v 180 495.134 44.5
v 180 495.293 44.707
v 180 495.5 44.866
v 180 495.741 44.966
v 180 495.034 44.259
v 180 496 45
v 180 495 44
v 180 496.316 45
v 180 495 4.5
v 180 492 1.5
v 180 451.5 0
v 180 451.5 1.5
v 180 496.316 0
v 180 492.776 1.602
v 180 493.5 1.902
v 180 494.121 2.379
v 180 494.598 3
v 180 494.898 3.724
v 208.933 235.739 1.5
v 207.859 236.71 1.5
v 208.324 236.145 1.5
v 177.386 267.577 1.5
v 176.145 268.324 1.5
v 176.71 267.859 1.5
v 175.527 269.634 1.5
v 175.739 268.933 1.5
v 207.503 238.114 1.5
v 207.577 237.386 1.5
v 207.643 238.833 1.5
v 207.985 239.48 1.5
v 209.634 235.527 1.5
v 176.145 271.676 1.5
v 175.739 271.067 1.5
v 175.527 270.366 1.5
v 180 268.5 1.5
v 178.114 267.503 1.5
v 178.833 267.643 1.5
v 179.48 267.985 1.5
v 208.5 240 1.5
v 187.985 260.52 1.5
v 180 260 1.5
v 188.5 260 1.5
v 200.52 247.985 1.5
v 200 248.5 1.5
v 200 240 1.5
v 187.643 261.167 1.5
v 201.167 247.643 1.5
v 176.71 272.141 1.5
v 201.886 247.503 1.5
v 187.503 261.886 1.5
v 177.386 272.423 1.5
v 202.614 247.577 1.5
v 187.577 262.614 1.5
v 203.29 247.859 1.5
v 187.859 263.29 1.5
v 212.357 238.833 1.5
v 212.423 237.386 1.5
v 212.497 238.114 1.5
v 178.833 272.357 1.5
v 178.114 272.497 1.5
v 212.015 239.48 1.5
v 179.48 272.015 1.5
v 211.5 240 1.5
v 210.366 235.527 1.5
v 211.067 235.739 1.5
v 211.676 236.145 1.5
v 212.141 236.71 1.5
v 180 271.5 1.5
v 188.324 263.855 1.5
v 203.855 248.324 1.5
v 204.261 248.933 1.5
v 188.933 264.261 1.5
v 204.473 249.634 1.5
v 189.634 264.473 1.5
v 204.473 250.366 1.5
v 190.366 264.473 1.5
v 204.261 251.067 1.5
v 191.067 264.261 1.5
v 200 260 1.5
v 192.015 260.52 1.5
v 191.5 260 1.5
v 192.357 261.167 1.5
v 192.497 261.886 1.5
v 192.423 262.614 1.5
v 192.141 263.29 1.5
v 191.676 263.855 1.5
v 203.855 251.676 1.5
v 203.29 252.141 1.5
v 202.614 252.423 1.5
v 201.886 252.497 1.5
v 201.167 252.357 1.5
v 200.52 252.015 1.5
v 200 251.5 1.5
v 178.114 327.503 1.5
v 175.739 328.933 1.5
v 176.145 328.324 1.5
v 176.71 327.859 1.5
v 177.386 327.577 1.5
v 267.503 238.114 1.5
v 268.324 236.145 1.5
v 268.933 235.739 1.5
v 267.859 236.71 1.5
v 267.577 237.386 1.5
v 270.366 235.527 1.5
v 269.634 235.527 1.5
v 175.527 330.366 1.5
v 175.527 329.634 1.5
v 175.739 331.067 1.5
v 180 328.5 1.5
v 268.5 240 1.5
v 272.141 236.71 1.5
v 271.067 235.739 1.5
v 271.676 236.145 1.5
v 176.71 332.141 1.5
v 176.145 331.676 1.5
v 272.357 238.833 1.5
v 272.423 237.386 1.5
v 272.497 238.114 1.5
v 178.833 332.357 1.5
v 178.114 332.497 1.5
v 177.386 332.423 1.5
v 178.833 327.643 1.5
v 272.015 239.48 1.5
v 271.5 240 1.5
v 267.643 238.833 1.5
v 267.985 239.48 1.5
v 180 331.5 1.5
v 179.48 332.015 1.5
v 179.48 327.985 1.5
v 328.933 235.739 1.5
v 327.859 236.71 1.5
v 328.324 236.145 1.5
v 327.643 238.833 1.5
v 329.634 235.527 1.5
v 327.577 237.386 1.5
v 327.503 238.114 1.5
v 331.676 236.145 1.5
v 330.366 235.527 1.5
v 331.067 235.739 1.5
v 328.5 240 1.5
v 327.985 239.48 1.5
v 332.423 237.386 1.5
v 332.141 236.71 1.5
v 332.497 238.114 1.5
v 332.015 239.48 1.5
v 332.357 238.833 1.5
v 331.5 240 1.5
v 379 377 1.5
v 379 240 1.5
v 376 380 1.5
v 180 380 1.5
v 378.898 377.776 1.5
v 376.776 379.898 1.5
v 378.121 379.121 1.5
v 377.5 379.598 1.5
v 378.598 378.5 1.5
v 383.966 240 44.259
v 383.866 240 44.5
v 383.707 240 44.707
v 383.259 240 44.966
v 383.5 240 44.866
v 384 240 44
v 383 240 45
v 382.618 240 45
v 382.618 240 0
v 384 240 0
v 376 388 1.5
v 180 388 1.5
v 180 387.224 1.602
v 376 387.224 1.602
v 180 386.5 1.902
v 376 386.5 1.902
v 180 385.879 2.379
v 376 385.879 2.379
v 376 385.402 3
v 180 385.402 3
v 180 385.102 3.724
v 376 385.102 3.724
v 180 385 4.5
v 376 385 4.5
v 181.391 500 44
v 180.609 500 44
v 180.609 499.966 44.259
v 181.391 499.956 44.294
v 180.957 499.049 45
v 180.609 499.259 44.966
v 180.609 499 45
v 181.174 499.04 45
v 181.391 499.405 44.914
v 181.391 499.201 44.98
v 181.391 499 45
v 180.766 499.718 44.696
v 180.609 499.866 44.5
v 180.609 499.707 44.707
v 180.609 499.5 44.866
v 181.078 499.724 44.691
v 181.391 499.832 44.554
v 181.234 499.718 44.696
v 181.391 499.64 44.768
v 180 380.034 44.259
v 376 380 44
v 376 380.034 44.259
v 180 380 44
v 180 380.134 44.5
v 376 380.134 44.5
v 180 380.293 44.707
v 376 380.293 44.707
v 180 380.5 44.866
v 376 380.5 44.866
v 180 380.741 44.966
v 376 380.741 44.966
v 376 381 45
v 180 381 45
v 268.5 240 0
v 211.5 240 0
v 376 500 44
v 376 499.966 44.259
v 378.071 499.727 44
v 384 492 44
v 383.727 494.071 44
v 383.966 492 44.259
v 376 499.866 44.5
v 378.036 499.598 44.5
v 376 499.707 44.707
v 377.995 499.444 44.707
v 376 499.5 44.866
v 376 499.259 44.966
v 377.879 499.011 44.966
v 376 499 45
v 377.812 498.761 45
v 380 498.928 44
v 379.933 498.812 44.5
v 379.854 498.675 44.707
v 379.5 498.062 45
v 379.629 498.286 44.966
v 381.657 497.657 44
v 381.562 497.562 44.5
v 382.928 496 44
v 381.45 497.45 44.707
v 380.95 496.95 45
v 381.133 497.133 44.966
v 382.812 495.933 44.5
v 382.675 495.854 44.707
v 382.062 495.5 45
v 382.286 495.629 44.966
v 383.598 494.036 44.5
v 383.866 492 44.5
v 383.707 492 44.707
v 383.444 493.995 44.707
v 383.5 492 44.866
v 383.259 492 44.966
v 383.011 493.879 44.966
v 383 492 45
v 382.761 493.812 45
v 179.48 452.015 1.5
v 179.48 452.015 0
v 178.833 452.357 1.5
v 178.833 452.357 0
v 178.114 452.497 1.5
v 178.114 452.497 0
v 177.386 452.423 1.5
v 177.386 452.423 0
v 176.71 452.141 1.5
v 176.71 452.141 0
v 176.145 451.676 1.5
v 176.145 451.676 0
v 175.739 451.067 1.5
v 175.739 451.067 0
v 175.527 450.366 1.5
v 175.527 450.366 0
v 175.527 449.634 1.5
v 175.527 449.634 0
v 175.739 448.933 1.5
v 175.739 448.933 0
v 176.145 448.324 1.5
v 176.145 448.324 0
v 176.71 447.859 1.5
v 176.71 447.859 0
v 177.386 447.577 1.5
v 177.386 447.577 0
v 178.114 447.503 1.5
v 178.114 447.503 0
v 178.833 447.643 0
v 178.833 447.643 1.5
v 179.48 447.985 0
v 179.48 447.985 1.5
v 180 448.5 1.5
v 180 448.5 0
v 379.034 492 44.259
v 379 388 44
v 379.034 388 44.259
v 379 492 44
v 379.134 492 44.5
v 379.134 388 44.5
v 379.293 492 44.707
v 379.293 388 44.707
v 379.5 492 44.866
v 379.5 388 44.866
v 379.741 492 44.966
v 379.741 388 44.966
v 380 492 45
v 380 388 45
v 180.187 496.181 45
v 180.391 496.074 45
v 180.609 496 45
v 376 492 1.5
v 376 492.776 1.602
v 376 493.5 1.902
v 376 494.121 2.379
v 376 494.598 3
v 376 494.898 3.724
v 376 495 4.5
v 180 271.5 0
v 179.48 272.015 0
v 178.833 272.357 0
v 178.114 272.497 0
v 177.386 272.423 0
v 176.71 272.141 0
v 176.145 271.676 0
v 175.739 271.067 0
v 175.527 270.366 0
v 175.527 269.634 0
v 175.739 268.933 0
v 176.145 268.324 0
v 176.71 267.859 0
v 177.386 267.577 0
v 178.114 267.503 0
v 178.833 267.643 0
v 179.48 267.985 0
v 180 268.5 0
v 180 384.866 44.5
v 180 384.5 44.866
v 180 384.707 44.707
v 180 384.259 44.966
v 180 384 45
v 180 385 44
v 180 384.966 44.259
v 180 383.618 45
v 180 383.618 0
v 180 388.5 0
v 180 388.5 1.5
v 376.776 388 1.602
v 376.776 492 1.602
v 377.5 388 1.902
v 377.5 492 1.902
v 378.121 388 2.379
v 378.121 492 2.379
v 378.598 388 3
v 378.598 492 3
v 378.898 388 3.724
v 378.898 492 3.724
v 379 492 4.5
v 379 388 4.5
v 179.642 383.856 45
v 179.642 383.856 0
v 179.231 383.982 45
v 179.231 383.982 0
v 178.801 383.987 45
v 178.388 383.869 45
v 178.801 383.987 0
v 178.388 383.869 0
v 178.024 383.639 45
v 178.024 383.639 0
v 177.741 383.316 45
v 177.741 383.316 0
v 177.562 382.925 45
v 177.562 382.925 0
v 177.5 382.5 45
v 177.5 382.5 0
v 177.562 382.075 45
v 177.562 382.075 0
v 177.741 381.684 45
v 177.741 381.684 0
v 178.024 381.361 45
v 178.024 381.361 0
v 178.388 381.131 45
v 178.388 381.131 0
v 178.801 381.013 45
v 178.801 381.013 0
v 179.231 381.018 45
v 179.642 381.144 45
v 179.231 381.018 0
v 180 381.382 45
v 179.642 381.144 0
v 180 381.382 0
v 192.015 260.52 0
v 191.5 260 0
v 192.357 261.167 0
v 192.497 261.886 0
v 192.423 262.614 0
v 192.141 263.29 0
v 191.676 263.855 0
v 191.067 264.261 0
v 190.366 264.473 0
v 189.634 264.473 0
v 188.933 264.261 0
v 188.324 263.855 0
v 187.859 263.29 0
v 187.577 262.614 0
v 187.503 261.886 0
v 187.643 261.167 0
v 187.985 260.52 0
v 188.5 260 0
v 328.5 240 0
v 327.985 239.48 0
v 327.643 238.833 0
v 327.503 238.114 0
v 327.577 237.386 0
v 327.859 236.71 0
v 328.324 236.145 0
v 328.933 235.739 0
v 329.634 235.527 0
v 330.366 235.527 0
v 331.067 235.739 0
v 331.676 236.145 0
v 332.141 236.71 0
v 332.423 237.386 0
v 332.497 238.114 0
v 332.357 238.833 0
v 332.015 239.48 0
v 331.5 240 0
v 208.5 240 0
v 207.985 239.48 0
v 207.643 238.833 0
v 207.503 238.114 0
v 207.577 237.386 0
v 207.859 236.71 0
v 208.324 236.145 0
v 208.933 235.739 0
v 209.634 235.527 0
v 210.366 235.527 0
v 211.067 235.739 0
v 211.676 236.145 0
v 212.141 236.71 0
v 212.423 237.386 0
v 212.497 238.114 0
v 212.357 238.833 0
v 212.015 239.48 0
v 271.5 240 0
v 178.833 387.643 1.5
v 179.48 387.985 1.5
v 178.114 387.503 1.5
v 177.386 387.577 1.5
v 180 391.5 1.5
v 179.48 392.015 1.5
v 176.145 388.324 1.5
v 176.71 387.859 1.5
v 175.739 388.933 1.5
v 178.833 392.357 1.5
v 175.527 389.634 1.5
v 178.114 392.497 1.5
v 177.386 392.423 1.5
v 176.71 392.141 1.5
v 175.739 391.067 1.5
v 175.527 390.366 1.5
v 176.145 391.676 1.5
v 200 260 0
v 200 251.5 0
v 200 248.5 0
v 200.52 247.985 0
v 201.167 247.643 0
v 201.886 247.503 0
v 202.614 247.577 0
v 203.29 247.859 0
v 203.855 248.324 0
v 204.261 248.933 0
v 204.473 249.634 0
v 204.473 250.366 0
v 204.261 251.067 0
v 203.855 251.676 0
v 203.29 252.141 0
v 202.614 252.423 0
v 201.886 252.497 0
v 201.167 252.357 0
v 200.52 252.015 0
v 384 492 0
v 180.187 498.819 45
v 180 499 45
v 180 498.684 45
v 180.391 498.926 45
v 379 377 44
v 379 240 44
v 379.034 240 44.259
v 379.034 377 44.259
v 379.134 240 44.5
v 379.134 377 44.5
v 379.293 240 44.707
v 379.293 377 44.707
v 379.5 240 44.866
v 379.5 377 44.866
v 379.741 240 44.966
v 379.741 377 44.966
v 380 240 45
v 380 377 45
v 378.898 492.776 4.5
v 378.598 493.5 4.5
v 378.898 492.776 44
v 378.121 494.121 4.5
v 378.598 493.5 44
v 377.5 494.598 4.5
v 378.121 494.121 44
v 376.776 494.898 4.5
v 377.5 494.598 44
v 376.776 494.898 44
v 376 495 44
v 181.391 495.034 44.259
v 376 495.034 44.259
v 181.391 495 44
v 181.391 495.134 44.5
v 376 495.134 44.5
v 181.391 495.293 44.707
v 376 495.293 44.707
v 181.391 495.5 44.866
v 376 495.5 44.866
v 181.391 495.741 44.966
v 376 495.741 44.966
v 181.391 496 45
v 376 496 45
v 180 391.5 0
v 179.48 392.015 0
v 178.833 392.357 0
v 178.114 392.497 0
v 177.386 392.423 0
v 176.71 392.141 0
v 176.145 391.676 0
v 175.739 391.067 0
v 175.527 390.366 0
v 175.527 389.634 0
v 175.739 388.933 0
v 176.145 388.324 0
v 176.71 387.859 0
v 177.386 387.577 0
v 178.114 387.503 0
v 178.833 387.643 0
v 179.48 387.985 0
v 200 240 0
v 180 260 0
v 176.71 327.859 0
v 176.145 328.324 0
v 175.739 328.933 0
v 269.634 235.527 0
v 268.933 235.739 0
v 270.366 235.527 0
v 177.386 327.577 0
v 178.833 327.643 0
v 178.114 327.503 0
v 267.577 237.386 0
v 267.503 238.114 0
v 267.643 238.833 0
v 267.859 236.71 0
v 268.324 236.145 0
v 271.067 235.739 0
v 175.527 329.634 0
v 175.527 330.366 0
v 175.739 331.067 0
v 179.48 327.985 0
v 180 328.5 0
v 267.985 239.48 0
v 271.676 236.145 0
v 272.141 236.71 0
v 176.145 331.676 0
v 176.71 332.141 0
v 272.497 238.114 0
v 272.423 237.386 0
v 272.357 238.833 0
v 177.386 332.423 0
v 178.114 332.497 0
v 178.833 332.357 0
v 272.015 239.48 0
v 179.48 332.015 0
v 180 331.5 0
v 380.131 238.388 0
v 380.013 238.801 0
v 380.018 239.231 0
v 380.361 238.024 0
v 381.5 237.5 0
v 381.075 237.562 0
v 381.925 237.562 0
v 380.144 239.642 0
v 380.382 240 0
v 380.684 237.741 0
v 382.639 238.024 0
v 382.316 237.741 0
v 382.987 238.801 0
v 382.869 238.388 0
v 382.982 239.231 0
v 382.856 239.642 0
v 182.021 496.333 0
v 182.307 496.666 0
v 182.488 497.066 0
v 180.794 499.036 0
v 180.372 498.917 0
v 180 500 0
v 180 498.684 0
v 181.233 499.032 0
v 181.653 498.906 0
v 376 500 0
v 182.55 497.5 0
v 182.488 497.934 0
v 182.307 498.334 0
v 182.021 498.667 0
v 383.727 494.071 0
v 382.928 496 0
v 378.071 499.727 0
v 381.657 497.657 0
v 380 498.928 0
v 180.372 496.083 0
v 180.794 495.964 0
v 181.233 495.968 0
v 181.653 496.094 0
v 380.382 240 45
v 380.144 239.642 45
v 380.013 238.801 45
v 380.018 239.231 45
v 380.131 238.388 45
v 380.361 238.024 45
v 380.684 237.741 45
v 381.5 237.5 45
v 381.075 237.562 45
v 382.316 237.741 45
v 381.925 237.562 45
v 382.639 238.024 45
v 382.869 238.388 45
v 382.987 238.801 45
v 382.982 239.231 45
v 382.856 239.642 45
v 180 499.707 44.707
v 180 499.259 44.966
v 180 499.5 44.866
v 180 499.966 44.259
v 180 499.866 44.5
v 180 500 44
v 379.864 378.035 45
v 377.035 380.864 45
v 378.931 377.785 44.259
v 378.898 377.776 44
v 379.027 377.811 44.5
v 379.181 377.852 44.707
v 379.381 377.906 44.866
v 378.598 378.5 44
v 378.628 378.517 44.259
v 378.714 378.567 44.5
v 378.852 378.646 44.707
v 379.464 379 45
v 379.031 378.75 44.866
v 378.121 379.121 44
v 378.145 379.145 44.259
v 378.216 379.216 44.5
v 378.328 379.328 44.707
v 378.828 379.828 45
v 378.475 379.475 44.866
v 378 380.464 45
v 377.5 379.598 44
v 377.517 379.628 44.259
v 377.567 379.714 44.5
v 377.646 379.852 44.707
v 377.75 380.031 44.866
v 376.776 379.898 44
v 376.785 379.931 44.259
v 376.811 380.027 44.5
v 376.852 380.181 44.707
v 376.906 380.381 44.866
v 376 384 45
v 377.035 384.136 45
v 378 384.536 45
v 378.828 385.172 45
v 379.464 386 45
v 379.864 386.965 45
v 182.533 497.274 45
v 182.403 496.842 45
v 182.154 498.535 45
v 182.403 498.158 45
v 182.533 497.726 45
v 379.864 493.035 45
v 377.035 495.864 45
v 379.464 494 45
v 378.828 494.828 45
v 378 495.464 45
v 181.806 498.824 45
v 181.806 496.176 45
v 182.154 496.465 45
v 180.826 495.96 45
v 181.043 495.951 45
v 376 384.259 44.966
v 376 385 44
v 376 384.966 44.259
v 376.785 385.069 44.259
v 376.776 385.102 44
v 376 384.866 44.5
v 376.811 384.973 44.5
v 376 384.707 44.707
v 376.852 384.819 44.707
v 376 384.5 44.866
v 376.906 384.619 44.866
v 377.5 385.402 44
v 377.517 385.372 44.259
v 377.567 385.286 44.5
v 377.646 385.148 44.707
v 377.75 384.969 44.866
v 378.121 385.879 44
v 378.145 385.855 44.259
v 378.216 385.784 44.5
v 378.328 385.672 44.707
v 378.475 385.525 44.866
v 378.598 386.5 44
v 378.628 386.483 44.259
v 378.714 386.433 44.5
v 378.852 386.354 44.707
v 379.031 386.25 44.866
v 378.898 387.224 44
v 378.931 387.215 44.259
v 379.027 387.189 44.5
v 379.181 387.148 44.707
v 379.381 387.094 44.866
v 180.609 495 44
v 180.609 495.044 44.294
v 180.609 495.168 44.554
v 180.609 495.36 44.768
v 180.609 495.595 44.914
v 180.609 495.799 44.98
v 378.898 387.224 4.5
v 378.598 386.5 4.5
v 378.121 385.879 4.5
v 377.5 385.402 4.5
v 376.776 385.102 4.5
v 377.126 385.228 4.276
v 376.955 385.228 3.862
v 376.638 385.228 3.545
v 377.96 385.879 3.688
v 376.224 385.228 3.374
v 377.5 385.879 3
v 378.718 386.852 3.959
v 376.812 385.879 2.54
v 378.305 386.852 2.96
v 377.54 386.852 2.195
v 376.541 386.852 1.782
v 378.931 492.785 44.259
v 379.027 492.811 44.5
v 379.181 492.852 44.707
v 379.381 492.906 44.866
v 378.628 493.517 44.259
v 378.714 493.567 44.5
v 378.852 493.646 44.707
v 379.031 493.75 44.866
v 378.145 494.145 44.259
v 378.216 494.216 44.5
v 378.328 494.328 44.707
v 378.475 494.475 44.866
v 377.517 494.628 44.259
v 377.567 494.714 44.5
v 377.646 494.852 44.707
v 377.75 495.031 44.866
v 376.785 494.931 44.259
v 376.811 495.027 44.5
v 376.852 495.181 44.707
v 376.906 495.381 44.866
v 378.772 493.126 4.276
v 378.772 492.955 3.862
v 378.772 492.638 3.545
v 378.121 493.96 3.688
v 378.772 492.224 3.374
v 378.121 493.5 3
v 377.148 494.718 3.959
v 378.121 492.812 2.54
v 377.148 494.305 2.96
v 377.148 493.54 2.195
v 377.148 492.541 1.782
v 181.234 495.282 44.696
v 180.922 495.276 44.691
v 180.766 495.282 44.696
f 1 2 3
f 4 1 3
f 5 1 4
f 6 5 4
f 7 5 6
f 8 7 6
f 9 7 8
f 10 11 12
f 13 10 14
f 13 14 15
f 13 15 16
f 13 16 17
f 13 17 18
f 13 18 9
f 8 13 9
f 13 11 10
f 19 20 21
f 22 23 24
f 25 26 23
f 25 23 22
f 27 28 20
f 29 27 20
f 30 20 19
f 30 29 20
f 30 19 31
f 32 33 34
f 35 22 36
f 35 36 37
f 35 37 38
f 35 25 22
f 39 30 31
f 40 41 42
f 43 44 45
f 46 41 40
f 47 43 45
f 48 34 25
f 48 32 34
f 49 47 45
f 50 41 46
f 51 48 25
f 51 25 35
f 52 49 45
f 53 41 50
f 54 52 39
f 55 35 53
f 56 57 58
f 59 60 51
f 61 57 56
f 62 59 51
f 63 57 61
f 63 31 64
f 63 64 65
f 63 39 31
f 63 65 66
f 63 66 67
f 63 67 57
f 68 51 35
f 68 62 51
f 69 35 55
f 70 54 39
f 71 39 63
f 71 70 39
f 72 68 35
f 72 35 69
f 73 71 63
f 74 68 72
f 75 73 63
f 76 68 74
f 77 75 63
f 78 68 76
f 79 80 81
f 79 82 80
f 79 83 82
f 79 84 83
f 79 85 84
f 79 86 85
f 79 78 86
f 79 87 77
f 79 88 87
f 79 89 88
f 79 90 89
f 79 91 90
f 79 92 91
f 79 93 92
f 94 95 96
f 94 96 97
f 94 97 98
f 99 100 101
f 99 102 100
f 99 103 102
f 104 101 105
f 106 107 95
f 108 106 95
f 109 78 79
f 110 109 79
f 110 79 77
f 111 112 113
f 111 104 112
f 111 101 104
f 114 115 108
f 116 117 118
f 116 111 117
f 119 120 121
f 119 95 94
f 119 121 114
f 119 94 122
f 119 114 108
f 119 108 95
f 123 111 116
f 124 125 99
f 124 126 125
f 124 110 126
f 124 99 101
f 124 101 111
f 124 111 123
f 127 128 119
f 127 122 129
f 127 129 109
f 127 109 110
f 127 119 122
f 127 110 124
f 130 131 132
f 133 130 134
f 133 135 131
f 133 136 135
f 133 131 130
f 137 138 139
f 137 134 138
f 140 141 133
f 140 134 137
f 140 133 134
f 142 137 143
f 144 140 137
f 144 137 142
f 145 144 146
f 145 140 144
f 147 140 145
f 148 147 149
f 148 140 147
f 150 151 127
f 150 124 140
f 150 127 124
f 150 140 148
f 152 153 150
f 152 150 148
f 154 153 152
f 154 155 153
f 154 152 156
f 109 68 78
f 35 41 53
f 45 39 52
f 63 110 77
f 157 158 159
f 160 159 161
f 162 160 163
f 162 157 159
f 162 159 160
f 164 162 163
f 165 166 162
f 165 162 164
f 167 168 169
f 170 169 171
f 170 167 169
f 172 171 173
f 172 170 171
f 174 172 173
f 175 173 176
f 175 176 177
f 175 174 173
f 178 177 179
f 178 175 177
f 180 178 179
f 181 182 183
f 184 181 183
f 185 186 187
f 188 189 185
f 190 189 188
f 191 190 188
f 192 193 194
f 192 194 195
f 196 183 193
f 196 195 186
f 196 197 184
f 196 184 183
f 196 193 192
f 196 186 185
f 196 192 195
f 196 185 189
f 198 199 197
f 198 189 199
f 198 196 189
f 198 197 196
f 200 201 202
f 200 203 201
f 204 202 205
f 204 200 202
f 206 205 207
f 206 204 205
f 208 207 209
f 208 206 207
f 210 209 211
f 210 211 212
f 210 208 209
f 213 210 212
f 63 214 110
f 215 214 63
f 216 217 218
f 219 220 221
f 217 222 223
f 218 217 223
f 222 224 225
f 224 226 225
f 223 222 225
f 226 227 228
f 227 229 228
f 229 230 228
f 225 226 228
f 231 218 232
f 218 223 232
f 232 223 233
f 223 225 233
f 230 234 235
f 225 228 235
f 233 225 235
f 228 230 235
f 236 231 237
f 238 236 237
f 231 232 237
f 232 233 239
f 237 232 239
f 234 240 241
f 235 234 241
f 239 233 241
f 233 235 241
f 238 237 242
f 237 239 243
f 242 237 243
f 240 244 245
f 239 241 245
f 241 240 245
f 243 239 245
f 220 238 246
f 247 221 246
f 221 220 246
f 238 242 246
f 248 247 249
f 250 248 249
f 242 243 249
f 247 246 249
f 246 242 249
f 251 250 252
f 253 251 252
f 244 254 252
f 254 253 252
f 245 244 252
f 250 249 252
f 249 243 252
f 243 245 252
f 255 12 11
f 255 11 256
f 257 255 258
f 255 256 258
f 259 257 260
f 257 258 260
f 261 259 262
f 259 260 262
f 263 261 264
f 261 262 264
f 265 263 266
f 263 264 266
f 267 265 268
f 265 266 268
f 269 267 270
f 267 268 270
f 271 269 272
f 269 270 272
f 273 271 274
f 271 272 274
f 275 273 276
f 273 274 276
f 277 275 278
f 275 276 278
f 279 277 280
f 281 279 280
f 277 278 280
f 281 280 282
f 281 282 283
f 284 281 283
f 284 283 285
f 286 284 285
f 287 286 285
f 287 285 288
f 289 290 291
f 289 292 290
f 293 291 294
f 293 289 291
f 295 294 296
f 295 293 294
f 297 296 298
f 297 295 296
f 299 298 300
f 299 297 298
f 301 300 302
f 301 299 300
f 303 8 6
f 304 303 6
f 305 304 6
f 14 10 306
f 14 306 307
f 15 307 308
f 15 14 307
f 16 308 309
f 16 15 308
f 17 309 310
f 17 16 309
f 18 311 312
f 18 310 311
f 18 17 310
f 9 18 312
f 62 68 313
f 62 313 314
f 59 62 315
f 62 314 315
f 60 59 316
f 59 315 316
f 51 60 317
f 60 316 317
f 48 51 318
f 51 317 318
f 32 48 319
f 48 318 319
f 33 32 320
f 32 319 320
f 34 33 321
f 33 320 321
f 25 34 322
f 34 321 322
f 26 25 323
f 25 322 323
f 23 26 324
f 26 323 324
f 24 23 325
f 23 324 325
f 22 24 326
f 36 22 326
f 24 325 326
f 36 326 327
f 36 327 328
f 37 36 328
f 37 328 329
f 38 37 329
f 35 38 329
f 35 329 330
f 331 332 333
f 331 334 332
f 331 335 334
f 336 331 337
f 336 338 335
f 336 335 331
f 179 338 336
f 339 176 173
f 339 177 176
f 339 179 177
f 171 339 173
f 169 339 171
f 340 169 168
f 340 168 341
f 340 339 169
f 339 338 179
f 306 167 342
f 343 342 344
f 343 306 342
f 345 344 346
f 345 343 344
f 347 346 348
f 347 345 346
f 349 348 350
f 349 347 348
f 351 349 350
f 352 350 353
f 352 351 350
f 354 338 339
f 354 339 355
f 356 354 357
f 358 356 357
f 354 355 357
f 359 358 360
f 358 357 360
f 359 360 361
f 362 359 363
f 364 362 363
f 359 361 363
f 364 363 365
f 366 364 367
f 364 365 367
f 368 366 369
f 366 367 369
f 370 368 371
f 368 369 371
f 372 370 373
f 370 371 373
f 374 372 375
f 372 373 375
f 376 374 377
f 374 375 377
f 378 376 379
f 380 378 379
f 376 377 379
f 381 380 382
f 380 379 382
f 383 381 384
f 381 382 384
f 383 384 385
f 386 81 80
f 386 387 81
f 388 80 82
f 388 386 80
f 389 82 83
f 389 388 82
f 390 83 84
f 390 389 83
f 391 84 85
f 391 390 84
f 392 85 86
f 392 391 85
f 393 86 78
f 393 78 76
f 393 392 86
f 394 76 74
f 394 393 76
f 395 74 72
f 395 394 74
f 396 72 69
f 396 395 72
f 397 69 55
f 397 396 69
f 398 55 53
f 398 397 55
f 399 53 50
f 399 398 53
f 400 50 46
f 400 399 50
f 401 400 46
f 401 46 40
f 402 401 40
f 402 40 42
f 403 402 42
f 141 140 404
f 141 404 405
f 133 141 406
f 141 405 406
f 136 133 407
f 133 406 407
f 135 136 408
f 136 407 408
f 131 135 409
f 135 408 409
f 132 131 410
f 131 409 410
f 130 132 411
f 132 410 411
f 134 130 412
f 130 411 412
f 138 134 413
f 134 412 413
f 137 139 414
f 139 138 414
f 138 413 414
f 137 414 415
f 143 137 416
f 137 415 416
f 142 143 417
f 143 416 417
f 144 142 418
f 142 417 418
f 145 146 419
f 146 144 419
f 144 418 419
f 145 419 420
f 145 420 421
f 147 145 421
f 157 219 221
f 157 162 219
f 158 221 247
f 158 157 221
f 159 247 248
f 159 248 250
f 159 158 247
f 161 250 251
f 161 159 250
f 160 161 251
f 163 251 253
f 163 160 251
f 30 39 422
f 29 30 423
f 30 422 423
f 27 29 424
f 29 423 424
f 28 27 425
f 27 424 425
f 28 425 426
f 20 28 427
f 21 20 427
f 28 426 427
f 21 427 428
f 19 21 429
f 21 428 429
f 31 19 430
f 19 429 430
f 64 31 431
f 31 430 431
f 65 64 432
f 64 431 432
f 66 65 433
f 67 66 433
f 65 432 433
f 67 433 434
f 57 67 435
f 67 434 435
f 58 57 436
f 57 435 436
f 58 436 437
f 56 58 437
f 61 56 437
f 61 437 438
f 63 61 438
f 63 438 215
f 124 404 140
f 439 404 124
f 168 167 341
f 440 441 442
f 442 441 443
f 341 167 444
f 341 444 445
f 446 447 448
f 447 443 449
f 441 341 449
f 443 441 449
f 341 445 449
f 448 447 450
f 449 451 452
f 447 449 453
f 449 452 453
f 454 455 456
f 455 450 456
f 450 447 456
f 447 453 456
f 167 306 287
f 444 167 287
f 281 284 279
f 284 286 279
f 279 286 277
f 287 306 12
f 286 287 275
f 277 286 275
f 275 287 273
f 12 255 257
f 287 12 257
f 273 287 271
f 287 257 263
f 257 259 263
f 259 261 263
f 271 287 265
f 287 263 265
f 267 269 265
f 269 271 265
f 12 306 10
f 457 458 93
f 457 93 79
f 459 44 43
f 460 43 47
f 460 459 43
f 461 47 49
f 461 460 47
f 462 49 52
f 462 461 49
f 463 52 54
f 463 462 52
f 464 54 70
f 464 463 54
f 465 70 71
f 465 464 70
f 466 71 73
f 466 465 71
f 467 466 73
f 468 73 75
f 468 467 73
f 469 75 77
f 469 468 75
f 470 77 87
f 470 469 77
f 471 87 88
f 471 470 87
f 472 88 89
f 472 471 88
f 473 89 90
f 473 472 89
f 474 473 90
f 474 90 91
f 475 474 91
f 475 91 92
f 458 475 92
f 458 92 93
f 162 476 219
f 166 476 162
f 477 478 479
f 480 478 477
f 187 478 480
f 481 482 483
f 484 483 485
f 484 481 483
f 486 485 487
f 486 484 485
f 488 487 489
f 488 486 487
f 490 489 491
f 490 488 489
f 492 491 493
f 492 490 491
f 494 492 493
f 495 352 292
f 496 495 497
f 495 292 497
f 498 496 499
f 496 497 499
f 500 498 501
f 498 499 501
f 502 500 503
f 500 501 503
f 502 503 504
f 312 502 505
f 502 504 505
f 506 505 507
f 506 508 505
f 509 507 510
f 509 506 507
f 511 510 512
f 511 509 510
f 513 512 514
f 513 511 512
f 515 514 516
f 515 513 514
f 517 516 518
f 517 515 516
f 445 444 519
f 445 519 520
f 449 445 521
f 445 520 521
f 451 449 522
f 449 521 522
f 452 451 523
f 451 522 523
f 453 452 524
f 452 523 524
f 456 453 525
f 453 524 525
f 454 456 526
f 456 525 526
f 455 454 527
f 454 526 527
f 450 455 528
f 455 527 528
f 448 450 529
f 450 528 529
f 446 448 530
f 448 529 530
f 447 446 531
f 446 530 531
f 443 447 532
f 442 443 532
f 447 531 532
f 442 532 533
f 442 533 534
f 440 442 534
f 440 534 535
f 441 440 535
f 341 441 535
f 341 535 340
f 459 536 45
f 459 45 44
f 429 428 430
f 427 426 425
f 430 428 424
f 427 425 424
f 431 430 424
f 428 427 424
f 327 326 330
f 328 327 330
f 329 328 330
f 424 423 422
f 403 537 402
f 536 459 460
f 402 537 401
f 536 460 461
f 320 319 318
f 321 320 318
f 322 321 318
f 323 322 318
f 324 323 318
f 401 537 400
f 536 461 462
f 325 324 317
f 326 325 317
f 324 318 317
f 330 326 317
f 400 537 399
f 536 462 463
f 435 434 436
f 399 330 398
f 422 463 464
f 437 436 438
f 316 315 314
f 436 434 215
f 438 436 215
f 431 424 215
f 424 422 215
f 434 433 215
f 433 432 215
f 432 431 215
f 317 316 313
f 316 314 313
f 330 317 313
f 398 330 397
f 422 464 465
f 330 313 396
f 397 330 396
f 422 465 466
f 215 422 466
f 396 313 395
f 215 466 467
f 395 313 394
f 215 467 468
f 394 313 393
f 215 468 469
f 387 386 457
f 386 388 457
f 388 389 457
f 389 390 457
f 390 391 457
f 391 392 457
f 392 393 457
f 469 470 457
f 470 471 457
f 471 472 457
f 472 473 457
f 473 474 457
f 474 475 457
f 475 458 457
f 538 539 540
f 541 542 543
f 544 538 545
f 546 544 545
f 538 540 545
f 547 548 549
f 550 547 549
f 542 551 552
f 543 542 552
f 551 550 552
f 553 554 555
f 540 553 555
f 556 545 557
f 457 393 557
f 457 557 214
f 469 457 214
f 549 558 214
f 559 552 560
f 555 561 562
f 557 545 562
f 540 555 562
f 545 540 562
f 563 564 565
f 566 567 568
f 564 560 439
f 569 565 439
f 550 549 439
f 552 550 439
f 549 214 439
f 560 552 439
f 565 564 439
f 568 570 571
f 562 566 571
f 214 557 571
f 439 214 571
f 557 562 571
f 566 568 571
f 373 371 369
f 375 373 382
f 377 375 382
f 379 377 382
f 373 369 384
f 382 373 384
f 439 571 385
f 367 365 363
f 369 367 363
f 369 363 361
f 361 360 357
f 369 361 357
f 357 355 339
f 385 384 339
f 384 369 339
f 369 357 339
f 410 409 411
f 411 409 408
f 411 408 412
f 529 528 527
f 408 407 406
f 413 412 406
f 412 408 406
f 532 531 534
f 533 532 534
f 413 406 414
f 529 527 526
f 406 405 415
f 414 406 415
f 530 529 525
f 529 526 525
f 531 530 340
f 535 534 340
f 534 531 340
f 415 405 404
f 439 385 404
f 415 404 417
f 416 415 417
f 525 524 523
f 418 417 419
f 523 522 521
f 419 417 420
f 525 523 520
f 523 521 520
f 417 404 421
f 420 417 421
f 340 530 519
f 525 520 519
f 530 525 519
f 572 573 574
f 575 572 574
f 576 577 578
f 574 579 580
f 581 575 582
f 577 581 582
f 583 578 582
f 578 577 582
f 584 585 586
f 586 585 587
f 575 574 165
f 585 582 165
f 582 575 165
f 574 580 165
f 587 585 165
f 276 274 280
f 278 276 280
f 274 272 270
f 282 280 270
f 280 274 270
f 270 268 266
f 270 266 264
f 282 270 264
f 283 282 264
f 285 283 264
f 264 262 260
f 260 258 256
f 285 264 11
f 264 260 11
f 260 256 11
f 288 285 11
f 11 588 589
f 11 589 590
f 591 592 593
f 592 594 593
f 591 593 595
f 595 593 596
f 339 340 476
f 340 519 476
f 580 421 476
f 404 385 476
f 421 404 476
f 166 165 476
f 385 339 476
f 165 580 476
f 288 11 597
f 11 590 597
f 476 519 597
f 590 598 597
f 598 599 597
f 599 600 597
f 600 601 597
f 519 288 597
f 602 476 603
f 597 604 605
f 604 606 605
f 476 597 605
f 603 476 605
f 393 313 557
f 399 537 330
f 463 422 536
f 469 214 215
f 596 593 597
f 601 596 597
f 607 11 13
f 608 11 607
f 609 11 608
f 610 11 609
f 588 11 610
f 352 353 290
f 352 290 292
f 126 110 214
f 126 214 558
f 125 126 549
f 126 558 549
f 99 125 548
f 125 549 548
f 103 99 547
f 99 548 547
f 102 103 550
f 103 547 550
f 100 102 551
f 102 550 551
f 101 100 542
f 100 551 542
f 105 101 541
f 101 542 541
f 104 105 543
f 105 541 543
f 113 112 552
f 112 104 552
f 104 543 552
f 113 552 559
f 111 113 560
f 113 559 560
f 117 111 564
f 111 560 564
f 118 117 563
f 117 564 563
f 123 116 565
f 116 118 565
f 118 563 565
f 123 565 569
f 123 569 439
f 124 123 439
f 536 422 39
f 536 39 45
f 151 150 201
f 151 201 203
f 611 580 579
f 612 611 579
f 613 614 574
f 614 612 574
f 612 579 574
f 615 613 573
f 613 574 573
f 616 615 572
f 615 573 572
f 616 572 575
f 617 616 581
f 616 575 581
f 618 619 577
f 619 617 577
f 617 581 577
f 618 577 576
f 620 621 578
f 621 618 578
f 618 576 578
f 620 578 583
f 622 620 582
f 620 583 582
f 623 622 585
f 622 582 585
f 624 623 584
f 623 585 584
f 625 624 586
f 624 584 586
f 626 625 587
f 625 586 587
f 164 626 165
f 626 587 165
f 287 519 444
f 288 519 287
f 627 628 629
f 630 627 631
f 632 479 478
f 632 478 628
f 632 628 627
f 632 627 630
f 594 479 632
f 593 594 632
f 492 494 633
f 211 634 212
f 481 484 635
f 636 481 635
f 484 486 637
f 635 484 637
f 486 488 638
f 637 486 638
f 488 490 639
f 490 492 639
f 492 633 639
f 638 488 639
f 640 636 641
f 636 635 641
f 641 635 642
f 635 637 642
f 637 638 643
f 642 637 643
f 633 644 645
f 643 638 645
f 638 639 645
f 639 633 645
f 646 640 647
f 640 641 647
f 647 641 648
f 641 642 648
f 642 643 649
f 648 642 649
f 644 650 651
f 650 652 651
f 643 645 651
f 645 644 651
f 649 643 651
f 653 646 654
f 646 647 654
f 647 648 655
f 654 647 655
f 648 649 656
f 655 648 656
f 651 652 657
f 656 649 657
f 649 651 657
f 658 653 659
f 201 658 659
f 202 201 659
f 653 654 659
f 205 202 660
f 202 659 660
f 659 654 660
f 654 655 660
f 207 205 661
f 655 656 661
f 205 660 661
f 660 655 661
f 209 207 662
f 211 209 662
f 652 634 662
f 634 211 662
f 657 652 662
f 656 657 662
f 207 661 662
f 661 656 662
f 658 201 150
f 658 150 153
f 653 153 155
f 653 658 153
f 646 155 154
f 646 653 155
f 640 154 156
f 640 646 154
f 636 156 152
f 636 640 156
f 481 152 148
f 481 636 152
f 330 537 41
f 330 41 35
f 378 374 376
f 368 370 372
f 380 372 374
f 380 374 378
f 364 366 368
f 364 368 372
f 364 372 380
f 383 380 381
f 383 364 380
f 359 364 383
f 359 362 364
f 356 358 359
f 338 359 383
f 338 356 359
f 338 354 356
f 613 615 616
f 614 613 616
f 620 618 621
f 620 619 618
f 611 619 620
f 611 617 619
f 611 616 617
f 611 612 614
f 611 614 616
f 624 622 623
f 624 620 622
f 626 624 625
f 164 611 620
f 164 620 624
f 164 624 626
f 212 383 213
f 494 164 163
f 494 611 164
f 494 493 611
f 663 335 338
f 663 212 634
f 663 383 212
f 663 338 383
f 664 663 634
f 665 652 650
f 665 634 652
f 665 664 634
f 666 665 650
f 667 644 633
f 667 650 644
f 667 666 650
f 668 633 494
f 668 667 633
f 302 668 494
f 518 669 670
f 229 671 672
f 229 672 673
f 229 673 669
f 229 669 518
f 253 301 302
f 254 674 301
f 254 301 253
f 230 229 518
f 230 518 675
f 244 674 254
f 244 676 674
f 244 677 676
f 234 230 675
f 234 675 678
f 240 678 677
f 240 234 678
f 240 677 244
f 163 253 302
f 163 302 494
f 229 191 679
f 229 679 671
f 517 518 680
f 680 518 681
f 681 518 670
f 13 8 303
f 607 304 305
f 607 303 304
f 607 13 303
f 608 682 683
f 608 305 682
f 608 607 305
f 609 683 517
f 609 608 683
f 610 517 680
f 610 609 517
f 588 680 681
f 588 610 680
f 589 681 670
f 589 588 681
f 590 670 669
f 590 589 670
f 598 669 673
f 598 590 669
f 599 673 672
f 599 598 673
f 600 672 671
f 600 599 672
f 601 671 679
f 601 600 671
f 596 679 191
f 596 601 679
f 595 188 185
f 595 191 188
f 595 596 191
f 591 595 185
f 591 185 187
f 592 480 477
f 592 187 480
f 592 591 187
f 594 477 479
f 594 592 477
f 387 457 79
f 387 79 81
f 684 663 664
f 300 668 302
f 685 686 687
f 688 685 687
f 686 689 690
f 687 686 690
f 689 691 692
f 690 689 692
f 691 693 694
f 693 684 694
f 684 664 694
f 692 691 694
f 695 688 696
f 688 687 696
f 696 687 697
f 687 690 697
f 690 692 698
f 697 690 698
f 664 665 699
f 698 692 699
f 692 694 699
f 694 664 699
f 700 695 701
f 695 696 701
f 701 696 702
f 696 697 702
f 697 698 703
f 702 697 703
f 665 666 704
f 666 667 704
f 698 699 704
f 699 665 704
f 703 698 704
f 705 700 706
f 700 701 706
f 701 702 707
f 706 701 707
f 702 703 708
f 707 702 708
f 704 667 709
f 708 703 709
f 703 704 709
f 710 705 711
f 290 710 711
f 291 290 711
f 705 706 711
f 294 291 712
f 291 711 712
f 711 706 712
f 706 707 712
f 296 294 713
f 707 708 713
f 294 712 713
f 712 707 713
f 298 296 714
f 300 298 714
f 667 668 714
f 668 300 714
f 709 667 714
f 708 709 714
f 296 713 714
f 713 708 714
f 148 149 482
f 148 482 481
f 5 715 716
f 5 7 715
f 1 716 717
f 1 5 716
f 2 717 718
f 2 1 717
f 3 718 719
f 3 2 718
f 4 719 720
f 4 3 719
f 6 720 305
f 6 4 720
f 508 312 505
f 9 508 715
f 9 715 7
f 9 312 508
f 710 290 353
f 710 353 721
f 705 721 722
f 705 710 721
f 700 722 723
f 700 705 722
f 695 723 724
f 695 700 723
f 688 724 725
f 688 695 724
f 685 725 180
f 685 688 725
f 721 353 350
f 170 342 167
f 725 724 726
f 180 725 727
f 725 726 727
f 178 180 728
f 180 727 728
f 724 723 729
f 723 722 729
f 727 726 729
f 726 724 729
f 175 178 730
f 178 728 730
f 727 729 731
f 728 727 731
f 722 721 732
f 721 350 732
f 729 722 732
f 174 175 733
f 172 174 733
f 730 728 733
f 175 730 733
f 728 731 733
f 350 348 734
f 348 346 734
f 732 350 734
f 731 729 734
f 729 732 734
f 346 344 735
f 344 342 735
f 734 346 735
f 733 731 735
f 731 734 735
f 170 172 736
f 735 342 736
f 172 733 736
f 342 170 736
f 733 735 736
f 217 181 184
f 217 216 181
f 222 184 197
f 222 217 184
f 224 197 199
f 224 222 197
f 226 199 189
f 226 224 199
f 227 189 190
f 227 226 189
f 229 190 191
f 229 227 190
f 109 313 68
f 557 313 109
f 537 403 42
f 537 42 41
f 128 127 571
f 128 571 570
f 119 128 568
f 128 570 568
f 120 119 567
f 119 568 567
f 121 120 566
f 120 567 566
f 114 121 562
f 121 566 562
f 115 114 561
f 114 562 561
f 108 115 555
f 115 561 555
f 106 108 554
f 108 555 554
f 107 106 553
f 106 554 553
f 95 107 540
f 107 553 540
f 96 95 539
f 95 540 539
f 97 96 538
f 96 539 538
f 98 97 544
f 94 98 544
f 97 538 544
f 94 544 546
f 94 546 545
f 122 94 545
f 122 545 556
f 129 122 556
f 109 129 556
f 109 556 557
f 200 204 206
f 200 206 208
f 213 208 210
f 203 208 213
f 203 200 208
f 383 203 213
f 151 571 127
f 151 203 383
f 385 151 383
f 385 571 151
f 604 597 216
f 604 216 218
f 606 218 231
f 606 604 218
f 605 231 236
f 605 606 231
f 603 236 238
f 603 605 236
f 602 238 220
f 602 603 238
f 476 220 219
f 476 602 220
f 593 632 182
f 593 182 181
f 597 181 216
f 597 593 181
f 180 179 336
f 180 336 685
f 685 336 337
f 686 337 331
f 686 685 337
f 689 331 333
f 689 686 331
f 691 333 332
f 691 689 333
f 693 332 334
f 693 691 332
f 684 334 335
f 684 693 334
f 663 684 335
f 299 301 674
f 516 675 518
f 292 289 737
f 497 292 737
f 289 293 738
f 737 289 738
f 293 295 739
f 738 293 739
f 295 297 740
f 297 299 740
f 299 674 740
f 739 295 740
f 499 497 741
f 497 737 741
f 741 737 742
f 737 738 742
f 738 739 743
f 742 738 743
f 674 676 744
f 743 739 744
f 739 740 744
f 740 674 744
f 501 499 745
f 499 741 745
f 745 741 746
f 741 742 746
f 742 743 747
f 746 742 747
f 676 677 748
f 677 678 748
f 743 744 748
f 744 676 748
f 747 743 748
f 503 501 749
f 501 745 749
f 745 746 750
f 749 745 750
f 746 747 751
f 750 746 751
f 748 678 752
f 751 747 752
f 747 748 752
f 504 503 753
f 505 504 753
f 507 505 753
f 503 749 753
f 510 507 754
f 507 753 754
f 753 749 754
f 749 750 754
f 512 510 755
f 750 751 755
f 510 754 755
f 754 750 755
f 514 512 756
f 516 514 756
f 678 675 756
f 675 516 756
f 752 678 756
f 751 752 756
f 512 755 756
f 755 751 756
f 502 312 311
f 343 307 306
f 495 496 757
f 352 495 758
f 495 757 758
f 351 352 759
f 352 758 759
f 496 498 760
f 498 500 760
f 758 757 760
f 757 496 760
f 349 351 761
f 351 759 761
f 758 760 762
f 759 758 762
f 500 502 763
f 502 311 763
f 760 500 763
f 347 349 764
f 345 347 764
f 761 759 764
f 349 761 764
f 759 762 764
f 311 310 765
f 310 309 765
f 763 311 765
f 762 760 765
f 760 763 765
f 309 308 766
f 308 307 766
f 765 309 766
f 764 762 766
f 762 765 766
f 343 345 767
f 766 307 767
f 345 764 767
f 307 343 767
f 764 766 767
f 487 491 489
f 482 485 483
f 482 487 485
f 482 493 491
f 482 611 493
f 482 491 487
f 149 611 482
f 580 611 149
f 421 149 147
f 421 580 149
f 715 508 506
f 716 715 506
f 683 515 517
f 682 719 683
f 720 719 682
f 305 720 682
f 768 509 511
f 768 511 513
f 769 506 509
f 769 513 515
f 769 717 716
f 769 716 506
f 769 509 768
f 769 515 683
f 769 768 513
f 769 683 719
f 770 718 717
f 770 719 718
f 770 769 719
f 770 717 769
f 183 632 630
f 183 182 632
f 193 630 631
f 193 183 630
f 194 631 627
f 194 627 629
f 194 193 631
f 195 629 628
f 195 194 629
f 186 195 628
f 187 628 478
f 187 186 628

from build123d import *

# Parameters (mm, degrees)
PAD012_DEPTH           = 1.5
PAD013_DEPTH           = 43.5
FILLET005_R            = 3
FILLET006_R            = 8
SKETCH020_R            = 1.5
PAD014_DEPTH           = 45
SKETCH021_R            = 1.55
POCKET005_DEPTH        = 45.001
FILLET007_R            = 1
SKETCH022_R            = 2.5
PAD015_DEPTH           = 1.5
LINEARPATTERN005_COUNT = 3
LINEARPATTERN005_PITCH = 60
SKETCH023_R            = 2.5
PAD016_DEPTH           = 1.5
LINEARPATTERN006_COUNT = 4
LINEARPATTERN006_PITCH = 60
SKETCH024_R            = 2.5
POCKET006_DEPTH        = 45.001


with BuildPart() as part:
    # Sketch018 (on XY_Plane003 of Origin006) → Pad012 (new body)
    with BuildSketch(Plane.XY):
        Polygon((200, 240), (200, 260), (180, 260), (180, 500), (384, 500), (384, 240), align=None)
    extrude(amount=PAD012_DEPTH)

    # Sketch019 (on Face4 of Pad012) → Pad013 (join)
    with BuildSketch(Plane.XY.offset(1.5)):
        Polygon((180, 495), (180, 500), (384, 500), (384, 240), (379, 240), (379, 380), (180, 380), (180, 385), (379, 385), (379, 495), align=None)
    extrude(amount=PAD013_DEPTH)

    # Fillet005
    fillet005_edges = [part.edges().sort_by_distance(p)[0] for p in [
        (379, 380, 23.25),
        (279.5, 495, 1.5),
        (379, 495, 23.25),
        (379, 440, 1.5),
        (379, 385, 23.25),
        (279.5, 385, 1.5),
    ]]
    fillet(fillet005_edges, radius=FILLET005_R)

    # Fillet006
    fillet006_edges = [part.edges().sort_by_distance(p)[0] for p in [
        (384, 500, 23.25),
    ]]
    fillet(fillet006_edges, radius=FILLET006_R)

    # Sketch020 (on XY_Plane003 of Origin006) → Pad014 (join)
    with BuildSketch(Plane.XY):
        with Locations((381.5, 239)):
            Circle(SKETCH020_R)
        with Locations((179, 382.5)):
            Circle(SKETCH020_R)
    extrude(amount=PAD014_DEPTH)

    # Sketch021 (on XY_Plane003 of Origin006) → Pocket005 (cut, through all)
    with BuildSketch(Plane.XY):
        with Locations((181, 497.5)):
            Circle(SKETCH021_R)
    extrude(amount=POCKET005_DEPTH, mode=Mode.SUBTRACT)

    # Fillet007
    fillet007_edges = [part.edges().sort_by_distance(p)[0] for p in [
        (278, 380, 45),
        (278, 385, 45),
        (384, 366, 45),
    ]]
    fillet(fillet007_edges, radius=FILLET007_R)

    # Sketch022 (on XY_Plane003 of Origin006) → Pad015 (join)
    with BuildSketch(Plane.XY):
        with Locations((330, 238)):
            Circle(SKETCH022_R)
    pad015 = extrude(amount=PAD015_DEPTH)

    # LinearPattern005: Pad015 ×3
    with Locations(*[(-i * LINEARPATTERN005_PITCH, 0, 0) for i in range(1, LINEARPATTERN005_COUNT)]):
        add(pad015)

    # Sketch023 (on XY_Plane003 of Origin006) → Pad016 (join)
    with BuildSketch(Plane.XY):
        with Locations((178, 270)):
            Circle(SKETCH023_R)
    pad016 = extrude(amount=PAD016_DEPTH)

    # LinearPattern006: Pad016 ×4
    with Locations(*[(0, i * LINEARPATTERN006_PITCH, 0) for i in range(1, LINEARPATTERN006_COUNT)]):
        add(pad016)

    # Sketch024 (on XY_Plane003 of Origin006) → Pocket006 (cut, through all)
    with BuildSketch(Plane.XY):
        with Locations((190, 262)):
            Circle(SKETCH024_R)
        with Locations((202, 250)):
            Circle(SKETCH024_R)
    extrude(amount=POCKET006_DEPTH, mode=Mode.SUBTRACT)


solid = part.part
